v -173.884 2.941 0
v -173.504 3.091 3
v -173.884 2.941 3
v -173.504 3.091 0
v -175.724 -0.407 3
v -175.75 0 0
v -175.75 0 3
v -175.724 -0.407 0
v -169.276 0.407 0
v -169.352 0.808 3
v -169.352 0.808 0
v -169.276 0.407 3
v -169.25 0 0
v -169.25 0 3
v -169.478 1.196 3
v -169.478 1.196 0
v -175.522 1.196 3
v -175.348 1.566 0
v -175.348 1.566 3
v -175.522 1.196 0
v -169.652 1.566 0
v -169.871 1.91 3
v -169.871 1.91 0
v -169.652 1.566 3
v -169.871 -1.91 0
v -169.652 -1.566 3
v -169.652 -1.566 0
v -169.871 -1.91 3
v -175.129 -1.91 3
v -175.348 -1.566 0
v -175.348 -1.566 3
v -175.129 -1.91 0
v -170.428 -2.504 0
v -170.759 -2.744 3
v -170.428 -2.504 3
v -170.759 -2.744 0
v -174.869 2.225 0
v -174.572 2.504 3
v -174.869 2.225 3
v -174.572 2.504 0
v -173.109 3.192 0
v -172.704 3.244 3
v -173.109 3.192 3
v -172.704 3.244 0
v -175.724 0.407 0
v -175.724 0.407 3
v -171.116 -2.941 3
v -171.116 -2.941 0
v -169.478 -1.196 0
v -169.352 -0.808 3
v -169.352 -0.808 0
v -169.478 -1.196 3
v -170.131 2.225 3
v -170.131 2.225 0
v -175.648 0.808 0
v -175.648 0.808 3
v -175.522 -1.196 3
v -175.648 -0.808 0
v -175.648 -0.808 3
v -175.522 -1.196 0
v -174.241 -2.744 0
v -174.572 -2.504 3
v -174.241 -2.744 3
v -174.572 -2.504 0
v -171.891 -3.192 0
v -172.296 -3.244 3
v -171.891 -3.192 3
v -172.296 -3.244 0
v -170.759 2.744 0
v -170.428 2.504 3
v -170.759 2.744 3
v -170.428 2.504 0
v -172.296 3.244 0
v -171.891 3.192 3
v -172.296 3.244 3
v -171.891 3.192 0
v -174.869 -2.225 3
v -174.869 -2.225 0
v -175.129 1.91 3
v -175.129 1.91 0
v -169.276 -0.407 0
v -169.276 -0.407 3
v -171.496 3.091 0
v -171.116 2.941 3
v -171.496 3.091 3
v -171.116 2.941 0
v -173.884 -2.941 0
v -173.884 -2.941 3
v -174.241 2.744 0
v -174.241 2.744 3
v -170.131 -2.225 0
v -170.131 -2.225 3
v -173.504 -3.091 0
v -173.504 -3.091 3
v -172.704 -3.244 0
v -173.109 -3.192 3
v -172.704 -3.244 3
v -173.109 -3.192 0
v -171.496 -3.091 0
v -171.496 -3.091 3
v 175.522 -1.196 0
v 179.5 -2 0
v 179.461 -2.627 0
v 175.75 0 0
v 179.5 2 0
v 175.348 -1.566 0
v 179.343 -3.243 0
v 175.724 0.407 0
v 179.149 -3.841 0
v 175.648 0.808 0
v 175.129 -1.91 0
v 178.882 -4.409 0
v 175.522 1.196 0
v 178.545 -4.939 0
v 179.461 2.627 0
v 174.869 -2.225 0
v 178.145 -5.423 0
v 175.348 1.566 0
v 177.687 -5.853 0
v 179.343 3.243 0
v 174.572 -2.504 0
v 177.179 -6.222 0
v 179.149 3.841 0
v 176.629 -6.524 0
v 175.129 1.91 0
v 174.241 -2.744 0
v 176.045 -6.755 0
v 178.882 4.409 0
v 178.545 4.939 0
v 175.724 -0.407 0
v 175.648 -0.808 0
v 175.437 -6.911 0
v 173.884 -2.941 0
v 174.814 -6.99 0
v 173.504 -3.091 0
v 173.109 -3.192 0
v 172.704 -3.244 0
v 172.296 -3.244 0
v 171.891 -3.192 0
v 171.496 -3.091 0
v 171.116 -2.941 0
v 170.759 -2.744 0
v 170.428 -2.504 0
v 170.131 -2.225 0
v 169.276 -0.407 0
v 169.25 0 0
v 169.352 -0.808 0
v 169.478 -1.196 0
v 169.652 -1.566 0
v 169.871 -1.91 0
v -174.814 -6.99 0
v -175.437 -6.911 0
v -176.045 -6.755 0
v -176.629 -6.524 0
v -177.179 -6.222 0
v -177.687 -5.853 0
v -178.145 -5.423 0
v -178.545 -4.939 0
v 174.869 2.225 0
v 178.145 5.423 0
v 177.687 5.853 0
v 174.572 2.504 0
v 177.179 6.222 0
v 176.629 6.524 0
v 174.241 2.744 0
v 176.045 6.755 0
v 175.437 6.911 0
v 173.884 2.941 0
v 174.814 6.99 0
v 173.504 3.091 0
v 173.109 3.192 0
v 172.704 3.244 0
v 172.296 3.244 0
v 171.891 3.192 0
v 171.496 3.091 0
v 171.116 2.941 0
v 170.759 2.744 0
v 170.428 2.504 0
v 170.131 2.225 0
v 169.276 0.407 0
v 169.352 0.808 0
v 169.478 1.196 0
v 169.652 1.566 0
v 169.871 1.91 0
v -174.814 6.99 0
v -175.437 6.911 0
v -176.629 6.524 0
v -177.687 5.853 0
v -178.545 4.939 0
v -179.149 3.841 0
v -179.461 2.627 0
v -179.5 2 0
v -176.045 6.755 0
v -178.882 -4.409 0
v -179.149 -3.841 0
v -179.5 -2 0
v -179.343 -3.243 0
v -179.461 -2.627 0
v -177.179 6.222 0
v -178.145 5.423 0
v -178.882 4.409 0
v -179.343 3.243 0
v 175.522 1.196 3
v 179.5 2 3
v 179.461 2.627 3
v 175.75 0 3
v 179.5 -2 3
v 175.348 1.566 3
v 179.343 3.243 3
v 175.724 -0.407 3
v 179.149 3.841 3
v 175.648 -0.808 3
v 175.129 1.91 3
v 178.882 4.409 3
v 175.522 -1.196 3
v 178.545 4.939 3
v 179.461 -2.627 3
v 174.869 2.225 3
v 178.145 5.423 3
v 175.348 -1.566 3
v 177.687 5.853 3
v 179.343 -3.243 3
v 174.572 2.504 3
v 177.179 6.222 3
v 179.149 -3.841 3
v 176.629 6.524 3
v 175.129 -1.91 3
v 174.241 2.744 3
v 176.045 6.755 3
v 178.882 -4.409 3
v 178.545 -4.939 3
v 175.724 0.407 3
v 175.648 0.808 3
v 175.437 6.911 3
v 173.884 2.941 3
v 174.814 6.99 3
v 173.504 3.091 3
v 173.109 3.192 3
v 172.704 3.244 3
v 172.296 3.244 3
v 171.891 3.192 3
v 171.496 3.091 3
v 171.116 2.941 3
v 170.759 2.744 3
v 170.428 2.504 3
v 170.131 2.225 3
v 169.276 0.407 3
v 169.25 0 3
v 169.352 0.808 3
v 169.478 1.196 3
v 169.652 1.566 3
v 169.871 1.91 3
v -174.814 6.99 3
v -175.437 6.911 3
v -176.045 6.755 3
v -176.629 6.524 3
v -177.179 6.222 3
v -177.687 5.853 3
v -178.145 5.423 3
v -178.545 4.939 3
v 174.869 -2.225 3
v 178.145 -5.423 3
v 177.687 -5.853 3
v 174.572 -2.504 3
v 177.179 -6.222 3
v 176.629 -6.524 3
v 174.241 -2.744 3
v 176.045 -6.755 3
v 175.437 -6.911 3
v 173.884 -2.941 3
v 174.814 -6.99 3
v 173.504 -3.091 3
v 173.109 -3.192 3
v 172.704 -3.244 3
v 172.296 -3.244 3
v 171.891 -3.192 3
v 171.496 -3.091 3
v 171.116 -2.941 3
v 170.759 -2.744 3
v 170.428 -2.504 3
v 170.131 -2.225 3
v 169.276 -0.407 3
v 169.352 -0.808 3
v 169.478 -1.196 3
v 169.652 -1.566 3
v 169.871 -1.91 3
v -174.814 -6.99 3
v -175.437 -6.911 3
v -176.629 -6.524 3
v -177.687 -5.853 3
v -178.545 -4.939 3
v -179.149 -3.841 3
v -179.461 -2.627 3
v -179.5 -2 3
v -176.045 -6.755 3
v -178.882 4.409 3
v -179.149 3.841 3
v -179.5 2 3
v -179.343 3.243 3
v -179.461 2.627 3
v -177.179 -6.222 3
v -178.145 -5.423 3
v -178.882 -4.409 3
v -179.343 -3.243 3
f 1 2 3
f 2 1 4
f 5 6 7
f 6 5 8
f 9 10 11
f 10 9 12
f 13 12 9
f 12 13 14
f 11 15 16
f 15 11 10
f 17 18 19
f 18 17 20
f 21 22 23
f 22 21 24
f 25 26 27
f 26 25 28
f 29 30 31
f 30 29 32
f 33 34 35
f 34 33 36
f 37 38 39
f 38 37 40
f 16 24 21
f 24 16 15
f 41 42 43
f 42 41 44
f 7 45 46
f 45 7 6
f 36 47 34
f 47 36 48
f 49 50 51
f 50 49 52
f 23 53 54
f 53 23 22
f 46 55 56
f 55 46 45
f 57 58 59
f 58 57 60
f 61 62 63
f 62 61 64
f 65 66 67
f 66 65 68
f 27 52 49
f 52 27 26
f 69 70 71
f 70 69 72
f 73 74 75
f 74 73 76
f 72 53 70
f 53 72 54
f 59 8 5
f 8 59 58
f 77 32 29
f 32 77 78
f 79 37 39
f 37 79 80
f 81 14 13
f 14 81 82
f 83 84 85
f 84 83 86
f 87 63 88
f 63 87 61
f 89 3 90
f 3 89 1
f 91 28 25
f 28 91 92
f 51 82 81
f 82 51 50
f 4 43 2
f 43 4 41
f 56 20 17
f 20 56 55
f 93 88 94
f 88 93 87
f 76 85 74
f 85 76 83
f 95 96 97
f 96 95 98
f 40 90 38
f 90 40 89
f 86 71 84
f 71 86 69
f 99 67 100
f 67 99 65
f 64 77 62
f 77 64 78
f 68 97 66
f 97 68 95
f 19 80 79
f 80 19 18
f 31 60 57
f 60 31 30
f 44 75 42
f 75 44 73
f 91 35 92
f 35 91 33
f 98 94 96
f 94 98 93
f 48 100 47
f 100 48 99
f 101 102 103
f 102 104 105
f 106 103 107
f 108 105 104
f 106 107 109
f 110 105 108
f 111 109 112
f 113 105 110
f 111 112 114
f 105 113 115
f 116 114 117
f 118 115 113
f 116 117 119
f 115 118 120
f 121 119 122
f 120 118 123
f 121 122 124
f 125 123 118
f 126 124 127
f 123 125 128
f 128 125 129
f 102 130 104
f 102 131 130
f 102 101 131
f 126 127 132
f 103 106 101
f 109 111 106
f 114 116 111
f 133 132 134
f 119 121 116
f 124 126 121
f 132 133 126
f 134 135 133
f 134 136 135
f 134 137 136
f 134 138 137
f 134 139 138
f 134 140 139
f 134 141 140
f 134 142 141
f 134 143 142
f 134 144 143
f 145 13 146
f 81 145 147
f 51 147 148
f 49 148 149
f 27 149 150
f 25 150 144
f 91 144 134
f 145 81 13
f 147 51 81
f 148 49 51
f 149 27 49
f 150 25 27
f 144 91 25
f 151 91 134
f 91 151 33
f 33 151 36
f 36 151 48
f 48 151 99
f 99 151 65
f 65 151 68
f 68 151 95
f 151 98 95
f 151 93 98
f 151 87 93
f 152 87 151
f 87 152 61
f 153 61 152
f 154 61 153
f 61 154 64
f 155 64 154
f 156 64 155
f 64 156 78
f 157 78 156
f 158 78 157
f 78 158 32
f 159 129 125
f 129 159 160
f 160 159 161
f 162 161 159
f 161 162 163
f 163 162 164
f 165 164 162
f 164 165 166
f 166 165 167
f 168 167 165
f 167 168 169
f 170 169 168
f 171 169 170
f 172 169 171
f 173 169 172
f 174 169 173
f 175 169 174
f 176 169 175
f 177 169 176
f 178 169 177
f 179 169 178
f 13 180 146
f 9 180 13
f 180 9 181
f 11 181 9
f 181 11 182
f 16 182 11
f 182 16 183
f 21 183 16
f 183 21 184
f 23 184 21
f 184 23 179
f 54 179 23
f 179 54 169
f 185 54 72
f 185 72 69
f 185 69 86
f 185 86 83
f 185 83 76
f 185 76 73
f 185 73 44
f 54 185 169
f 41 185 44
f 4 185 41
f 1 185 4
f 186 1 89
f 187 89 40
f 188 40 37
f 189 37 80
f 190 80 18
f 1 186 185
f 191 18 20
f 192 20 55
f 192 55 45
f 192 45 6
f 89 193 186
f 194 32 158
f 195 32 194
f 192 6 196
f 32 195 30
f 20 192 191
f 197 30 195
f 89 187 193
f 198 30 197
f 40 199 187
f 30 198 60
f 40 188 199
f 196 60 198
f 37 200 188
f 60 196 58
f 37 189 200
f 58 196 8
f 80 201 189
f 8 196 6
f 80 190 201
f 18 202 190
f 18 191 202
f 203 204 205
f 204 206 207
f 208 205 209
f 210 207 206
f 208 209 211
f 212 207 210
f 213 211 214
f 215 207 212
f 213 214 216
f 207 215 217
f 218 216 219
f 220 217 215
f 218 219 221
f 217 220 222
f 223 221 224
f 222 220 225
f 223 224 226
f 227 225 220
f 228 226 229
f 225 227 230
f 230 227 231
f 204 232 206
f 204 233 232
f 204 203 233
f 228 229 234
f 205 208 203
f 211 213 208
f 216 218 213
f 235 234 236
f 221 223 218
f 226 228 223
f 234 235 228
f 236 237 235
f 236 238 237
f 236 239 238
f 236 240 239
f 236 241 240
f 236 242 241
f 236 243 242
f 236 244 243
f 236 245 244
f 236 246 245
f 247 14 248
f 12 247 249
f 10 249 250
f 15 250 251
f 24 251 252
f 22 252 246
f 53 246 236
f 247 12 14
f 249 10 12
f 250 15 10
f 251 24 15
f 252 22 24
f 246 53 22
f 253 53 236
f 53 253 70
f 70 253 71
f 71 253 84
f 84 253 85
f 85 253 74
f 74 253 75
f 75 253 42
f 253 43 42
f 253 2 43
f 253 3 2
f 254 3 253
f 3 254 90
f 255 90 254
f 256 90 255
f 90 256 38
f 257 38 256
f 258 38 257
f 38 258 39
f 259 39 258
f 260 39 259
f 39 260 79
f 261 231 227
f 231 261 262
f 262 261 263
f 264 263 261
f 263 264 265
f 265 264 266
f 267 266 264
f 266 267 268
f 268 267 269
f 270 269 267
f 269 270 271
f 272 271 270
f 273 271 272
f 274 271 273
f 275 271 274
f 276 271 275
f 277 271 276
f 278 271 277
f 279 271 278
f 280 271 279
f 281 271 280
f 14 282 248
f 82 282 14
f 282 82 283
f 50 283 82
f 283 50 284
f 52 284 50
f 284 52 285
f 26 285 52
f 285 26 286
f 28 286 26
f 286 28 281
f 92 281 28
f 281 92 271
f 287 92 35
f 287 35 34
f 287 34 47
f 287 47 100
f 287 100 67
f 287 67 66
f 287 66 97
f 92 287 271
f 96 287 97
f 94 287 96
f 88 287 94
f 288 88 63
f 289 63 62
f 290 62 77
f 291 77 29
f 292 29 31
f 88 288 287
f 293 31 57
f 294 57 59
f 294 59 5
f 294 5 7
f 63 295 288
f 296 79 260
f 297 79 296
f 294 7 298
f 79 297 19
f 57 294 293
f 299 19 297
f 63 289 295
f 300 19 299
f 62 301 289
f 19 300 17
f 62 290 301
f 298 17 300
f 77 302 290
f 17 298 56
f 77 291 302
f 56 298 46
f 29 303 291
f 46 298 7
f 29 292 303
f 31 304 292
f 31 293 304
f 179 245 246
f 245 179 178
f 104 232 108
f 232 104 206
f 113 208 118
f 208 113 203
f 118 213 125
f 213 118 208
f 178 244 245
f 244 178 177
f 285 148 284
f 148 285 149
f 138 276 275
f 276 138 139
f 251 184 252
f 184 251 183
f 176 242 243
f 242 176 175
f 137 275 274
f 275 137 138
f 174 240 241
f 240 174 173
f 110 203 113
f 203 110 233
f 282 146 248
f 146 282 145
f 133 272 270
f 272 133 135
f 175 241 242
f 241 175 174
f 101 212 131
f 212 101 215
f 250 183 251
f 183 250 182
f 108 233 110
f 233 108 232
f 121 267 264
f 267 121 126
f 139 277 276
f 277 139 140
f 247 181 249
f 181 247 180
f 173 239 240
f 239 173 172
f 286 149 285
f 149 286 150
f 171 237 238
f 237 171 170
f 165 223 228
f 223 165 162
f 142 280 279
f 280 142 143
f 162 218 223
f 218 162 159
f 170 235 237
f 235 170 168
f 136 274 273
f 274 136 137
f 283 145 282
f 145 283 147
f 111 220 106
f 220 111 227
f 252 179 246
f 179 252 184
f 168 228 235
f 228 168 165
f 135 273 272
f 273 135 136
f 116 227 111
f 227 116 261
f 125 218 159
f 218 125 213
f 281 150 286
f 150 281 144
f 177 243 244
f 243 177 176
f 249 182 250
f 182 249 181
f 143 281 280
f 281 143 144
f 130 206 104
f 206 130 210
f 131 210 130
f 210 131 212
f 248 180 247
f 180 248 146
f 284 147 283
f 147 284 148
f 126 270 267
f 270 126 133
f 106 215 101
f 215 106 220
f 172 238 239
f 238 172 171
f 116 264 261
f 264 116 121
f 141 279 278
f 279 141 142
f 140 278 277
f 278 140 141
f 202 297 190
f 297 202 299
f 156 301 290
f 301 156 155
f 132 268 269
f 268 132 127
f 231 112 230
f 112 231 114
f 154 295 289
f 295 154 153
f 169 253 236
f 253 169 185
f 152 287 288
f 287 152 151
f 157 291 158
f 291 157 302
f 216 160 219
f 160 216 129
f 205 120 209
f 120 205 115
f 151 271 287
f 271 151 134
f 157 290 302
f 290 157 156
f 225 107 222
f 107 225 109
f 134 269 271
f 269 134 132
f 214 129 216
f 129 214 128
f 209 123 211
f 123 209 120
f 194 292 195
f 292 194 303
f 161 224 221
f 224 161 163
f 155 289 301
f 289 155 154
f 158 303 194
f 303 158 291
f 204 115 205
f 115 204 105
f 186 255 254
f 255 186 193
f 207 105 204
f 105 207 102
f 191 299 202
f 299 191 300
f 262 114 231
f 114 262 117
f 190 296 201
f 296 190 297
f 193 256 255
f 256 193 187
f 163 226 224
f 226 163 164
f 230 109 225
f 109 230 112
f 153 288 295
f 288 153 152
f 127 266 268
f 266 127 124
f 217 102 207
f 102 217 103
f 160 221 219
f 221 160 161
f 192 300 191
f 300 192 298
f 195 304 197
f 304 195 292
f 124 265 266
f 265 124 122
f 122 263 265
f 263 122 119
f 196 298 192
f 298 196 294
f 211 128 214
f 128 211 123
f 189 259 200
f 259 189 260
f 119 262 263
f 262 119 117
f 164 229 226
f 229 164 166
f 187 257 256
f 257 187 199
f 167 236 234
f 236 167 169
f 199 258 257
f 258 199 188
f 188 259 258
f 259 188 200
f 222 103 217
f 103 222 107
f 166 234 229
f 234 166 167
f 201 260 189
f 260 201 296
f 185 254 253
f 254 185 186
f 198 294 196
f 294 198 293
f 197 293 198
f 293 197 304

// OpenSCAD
$fn = 50;


difference() {
	union() {
		hull() {
			translate(v = [-174.5000000000, 2.0000000000, 0]) {
				cylinder(h = 3, r = 5);
			}
			translate(v = [174.5000000000, 2.0000000000, 0]) {
				cylinder(h = 3, r = 5);
			}
			translate(v = [-174.5000000000, -2.0000000000, 0]) {
				cylinder(h = 3, r = 5);
			}
			translate(v = [174.5000000000, -2.0000000000, 0]) {
				cylinder(h = 3, r = 5);
			}
		}
	}
	union() {
		translate(v = [-172.5000000000, 0.0000000000, 0]) {
			cylinder(h = 3, r = 3.2500000000);
		}
		translate(v = [172.5000000000, 0.0000000000, 0]) {
			cylinder(h = 3, r = 3.2500000000);
		}
		translate(v = [-172.5000000000, 0.0000000000, 0]) {
			cylinder(h = 3, r = 1.8000000000);
		}
		translate(v = [172.5000000000, 0.0000000000, 0]) {
			cylinder(h = 3, r = 1.8000000000);
		}
		translate(v = [-172.5000000000, 0.0000000000, 0]) {
			cylinder(h = 3, r = 1.8000000000);
		}
		translate(v = [172.5000000000, 0.0000000000, 0]) {
			cylinder(h = 3, r = 1.8000000000);
		}
		translate(v = [-172.5000000000, 0.0000000000, 0]) {
			cylinder(h = 3, r = 1.8000000000);
		}
		translate(v = [172.5000000000, 0.0000000000, 0]) {
			cylinder(h = 3, r = 1.8000000000);
		}
	}
}
